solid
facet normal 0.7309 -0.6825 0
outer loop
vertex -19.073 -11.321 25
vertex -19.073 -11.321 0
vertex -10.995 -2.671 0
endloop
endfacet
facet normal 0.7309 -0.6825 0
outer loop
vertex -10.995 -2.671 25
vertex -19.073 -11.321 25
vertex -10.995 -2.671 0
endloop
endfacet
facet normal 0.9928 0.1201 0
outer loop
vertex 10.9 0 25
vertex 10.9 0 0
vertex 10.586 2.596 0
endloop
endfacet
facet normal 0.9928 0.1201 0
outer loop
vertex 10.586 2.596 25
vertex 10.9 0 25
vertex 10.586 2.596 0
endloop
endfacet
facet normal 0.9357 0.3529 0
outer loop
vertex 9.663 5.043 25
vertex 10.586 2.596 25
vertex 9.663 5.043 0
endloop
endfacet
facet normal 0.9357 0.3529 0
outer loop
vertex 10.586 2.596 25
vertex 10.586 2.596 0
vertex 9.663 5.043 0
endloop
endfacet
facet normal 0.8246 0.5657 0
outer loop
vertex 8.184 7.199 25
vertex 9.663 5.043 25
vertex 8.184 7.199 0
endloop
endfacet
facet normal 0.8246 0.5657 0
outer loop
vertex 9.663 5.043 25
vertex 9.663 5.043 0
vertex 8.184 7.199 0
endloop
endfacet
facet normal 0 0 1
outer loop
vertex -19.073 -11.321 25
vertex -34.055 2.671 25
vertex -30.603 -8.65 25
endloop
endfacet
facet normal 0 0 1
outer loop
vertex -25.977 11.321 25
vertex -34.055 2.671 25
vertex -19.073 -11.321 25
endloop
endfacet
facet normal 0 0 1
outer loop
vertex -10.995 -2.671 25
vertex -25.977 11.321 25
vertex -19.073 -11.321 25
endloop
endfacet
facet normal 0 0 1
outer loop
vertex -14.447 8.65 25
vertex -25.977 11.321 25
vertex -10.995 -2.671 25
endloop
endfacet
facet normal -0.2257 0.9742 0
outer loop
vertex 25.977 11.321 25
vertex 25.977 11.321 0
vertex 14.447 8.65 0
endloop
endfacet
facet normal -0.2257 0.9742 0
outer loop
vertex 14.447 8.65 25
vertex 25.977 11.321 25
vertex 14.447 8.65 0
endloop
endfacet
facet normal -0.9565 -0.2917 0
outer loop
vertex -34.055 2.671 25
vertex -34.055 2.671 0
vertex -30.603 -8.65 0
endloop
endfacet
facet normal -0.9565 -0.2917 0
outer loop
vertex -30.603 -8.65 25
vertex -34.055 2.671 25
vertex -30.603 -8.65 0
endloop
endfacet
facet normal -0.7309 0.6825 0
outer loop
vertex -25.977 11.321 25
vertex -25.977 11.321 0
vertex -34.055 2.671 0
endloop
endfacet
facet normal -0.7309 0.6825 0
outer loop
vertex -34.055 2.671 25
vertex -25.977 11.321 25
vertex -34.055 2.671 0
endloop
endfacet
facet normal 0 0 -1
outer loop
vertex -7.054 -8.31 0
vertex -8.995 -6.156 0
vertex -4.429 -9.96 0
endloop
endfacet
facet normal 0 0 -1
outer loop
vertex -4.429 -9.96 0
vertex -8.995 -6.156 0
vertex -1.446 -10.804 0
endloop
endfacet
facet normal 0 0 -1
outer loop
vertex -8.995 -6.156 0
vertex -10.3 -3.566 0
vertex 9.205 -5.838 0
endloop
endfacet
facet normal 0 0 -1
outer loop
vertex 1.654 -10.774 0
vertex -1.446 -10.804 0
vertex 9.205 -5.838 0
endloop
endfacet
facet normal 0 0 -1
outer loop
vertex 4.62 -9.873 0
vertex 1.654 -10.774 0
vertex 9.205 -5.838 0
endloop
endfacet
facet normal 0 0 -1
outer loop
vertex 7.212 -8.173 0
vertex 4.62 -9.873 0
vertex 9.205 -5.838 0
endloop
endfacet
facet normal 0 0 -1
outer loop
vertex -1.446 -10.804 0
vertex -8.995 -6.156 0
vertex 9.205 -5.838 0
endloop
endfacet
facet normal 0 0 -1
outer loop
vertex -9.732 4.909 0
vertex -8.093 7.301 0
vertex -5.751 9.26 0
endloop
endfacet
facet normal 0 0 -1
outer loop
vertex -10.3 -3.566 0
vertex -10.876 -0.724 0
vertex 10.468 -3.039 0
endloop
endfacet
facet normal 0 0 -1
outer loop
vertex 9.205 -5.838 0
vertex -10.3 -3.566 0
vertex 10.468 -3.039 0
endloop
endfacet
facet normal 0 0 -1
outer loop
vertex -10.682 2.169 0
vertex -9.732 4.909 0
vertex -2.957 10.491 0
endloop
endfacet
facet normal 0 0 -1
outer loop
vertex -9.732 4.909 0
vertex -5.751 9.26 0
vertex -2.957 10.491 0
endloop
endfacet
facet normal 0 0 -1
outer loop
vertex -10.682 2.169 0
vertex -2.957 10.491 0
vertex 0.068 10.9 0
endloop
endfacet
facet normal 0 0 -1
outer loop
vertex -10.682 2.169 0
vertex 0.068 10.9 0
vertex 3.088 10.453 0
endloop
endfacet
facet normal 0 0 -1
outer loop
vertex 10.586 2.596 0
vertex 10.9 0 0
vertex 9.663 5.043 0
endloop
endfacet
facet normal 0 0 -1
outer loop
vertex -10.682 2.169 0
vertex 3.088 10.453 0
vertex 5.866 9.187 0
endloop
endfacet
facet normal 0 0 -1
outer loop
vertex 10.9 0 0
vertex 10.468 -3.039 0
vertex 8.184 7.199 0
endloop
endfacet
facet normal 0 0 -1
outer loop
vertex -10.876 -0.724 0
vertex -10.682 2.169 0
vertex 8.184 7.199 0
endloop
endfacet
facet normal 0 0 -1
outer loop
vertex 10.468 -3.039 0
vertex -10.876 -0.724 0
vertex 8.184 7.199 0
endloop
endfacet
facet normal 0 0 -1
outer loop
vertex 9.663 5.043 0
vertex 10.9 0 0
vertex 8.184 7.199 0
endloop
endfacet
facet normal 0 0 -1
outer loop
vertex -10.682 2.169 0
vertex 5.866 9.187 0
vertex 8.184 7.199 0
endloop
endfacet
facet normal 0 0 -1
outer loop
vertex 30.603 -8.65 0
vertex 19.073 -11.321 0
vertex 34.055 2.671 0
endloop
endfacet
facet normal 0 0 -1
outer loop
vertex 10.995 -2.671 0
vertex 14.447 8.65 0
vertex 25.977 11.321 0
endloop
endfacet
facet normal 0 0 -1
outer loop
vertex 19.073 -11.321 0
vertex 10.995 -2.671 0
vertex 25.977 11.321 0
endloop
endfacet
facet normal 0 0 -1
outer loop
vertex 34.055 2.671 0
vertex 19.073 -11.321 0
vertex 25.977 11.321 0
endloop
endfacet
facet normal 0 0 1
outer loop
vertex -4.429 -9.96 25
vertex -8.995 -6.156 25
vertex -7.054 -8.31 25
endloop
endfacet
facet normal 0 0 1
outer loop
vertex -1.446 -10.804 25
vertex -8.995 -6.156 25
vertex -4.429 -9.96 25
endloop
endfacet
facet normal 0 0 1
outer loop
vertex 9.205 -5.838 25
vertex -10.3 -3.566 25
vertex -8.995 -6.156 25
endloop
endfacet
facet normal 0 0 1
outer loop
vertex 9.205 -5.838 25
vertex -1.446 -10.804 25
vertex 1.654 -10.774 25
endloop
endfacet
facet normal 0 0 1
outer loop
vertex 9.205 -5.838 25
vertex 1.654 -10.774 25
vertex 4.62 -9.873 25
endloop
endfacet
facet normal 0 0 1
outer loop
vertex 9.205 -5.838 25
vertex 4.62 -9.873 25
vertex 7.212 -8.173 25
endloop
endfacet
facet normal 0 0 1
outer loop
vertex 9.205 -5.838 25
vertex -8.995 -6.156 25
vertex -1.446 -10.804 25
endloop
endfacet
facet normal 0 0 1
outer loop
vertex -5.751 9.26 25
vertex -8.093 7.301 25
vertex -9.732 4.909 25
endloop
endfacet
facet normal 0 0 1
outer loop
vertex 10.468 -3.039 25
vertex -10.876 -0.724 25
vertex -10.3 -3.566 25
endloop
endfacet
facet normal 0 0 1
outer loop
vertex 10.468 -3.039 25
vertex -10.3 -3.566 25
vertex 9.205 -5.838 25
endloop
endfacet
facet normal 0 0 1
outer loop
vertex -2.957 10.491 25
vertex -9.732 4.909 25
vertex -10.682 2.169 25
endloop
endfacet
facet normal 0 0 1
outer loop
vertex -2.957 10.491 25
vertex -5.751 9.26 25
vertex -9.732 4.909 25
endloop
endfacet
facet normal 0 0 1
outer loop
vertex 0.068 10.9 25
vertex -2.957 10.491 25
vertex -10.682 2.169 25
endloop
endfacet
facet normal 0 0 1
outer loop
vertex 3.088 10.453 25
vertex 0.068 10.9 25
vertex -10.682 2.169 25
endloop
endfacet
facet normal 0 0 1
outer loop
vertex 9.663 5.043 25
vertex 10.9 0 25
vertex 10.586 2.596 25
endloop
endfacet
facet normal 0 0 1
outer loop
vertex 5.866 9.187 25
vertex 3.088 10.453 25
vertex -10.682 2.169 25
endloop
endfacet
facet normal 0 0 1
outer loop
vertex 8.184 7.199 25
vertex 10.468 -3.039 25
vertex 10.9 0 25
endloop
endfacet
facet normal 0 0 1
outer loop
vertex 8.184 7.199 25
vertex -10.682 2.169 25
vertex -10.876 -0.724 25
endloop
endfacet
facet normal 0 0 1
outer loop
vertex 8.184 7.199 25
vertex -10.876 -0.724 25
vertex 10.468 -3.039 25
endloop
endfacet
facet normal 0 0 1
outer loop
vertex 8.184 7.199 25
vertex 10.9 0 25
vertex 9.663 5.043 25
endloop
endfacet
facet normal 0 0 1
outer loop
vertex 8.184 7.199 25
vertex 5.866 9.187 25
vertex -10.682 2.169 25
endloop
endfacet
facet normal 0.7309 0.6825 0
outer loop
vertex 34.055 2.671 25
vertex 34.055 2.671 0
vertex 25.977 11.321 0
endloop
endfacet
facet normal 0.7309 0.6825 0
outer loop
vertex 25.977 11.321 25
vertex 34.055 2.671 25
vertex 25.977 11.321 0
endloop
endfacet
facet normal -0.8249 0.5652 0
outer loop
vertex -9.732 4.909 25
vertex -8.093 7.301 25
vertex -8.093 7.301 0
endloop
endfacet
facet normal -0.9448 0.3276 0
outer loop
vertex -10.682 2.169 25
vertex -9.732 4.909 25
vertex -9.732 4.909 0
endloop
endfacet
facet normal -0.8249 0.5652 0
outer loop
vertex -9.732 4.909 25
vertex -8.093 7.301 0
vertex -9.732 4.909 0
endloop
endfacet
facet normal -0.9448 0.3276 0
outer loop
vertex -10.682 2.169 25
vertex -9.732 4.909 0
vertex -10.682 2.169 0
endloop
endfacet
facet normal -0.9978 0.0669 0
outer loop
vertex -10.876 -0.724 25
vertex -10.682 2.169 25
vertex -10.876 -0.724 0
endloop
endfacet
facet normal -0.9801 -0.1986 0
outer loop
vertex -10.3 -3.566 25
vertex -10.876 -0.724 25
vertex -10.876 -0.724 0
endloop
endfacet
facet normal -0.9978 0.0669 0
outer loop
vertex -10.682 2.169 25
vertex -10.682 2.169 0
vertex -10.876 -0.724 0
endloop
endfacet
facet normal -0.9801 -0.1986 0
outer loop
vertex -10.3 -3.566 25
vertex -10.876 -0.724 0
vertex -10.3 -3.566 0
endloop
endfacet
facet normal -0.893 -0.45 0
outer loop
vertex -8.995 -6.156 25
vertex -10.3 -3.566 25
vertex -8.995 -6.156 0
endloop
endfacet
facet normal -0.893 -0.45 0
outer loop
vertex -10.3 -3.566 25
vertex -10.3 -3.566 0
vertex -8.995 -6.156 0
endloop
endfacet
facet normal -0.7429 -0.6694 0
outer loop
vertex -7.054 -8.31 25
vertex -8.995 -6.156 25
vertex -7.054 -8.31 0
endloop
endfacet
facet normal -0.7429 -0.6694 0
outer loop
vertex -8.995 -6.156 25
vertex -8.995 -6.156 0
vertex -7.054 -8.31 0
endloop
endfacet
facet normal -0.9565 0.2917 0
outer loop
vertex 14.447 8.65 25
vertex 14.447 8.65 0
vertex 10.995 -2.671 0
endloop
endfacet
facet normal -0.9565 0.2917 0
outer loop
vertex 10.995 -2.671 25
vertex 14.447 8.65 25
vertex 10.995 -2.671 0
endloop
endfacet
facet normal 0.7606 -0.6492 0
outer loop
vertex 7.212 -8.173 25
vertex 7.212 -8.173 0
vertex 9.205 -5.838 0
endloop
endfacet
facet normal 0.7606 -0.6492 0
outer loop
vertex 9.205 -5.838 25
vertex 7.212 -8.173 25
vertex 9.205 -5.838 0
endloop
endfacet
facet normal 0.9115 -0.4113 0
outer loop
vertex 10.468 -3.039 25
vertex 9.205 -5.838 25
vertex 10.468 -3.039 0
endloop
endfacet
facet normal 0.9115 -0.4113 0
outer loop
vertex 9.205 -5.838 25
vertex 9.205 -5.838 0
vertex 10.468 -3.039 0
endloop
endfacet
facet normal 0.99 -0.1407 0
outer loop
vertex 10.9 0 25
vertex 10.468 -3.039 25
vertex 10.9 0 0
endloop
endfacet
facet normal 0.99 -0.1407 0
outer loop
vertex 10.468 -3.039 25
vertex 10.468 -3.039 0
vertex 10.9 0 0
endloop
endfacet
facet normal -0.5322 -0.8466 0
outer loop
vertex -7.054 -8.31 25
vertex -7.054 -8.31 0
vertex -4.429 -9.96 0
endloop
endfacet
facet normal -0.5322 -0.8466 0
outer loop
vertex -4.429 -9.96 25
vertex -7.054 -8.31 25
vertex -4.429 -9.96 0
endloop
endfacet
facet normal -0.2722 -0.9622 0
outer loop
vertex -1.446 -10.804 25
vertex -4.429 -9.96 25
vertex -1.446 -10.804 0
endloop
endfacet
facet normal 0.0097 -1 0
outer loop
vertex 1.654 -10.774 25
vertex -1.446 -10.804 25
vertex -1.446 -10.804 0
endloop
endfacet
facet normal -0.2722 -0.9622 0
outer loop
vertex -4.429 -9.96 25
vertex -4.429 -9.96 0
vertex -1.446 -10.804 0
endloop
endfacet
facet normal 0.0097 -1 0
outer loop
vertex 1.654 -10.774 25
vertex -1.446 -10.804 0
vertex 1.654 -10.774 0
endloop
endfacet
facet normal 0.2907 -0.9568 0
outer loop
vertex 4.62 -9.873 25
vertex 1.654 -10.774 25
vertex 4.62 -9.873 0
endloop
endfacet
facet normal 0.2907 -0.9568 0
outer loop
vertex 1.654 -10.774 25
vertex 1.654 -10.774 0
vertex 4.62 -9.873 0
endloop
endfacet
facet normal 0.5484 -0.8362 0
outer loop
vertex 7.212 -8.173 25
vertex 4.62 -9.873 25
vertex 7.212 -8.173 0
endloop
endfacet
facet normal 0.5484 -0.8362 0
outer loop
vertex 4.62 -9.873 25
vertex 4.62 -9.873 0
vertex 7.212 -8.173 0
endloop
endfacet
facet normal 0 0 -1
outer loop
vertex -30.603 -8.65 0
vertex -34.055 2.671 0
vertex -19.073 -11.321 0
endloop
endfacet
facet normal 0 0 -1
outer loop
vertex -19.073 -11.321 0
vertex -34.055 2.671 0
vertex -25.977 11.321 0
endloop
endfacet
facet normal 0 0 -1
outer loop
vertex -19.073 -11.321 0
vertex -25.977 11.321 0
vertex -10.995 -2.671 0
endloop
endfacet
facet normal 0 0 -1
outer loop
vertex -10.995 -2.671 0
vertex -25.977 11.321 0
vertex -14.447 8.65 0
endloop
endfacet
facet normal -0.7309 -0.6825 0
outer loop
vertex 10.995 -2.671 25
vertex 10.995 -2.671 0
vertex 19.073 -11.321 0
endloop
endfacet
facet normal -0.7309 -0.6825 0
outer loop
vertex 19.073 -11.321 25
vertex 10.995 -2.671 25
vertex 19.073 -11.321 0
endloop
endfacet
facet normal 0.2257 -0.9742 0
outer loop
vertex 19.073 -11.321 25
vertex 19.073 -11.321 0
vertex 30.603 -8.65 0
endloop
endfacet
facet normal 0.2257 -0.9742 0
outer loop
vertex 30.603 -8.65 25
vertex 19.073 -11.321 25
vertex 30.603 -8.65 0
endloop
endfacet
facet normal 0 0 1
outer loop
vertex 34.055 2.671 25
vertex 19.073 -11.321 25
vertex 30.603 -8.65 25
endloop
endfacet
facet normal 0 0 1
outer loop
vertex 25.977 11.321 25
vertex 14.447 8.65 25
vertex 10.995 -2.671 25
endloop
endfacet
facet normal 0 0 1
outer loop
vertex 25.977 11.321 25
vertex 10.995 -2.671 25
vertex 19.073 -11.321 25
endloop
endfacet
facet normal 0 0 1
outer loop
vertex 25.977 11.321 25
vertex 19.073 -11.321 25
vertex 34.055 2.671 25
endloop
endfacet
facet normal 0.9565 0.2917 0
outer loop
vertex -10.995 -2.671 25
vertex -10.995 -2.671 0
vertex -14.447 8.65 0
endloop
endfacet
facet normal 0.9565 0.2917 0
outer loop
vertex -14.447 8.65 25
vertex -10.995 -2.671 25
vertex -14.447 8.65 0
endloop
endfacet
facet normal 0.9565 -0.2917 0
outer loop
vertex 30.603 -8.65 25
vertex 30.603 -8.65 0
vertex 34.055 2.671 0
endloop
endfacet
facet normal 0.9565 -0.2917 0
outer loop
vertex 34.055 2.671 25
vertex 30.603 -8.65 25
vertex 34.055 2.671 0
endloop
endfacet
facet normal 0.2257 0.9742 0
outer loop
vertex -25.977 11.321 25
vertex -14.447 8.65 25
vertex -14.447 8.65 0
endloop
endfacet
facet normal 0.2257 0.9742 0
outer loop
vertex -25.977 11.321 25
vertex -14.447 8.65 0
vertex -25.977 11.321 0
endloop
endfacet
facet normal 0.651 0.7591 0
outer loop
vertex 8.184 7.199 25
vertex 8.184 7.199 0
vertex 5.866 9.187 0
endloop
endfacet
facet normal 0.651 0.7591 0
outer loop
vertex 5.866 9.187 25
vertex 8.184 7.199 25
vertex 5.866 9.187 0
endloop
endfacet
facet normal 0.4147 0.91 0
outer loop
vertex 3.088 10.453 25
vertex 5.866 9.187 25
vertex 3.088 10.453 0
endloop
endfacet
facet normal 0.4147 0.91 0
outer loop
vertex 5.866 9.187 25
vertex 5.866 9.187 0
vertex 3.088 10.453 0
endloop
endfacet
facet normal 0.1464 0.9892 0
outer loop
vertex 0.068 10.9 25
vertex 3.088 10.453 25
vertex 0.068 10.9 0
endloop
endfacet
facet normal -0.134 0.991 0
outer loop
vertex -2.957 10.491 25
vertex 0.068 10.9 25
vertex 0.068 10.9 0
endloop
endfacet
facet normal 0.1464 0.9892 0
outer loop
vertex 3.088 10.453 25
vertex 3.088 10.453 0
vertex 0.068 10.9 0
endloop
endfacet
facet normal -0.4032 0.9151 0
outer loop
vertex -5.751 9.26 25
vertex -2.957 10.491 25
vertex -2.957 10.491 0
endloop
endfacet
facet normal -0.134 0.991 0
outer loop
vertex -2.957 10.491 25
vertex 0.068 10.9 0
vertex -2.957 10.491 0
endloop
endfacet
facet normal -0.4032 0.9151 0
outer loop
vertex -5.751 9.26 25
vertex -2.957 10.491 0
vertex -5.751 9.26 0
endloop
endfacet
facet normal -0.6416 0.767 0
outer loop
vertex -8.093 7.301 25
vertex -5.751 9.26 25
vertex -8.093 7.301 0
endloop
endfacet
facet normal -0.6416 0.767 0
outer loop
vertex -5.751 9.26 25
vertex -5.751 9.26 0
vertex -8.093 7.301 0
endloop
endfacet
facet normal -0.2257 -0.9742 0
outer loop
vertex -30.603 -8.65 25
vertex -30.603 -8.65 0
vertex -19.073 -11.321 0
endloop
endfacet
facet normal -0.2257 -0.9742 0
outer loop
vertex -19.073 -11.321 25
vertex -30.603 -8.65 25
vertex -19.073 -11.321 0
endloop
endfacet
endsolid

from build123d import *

# Parameters (mm, degrees)
F1_DEPTH = 25


# Not quite as in the source:
# - a feature of the source that left no trace in its solid (it failed there, or was rolled back) is left out


with BuildPart() as f1:
    # F0 (on Top) → F1 (new body)
    with BuildSketch(Plane.XY):
        Polygon((-10.9947116086, -2.6709130821), (-14.4468207234, 8.6501414622), (-25.9771961137, 11.3210545442), (-34.0554623892, 2.6709130821), (-30.6033532745, -8.6501414622), (-19.0729778841, -11.3210545442), align=None)
    extrude(amount=F1_DEPTH)


with BuildPart() as f1b:
    # F0 (on Top) → F1, piece 2 (new body)
    with BuildSketch(Plane.XY):
        Polygon((25.9771961137, 11.3210545442), (14.4468207234, 8.6501414622), (10.9947116086, -2.6709130821), (19.0729778841, -11.3210545442), (30.6033532745, -8.6501414622), (34.0554623892, 2.6709130821), align=None)
    extrude(amount=F1_DEPTH)


with BuildPart() as f1c:
    # F0 (on Top) → F1, piece 3 (new body)
    with BuildSketch(Plane.XY):
        with BuildLine():
            ThreePointArc((7.2121566552, -8.1728083534), (9.9353537315, -4.4831625254), (10.9, 0))
            ThreePointArc((10.9, 0), (10.1984296374, 3.847341021), (8.1840306547, 7.1994195768))
            ThreePointArc((8.1840306547, 7.1994195768), (0.0683052099, 10.8997859795), (-8.0931588609, 7.3014231252))
            ThreePointArc((-8.0931588609, 7.3014231252), (-10.8759119881, -0.724250251), (-7.0535557785, -8.3100752632))
            ThreePointArc((-7.0535557785, -8.3100752632), (0.104876645, -10.899495442), (7.2121566552, -8.1728083534))
        make_face()
    extrude(amount=F1_DEPTH)


solid = Compound([f1.part, f1b.part, f1c.part])
